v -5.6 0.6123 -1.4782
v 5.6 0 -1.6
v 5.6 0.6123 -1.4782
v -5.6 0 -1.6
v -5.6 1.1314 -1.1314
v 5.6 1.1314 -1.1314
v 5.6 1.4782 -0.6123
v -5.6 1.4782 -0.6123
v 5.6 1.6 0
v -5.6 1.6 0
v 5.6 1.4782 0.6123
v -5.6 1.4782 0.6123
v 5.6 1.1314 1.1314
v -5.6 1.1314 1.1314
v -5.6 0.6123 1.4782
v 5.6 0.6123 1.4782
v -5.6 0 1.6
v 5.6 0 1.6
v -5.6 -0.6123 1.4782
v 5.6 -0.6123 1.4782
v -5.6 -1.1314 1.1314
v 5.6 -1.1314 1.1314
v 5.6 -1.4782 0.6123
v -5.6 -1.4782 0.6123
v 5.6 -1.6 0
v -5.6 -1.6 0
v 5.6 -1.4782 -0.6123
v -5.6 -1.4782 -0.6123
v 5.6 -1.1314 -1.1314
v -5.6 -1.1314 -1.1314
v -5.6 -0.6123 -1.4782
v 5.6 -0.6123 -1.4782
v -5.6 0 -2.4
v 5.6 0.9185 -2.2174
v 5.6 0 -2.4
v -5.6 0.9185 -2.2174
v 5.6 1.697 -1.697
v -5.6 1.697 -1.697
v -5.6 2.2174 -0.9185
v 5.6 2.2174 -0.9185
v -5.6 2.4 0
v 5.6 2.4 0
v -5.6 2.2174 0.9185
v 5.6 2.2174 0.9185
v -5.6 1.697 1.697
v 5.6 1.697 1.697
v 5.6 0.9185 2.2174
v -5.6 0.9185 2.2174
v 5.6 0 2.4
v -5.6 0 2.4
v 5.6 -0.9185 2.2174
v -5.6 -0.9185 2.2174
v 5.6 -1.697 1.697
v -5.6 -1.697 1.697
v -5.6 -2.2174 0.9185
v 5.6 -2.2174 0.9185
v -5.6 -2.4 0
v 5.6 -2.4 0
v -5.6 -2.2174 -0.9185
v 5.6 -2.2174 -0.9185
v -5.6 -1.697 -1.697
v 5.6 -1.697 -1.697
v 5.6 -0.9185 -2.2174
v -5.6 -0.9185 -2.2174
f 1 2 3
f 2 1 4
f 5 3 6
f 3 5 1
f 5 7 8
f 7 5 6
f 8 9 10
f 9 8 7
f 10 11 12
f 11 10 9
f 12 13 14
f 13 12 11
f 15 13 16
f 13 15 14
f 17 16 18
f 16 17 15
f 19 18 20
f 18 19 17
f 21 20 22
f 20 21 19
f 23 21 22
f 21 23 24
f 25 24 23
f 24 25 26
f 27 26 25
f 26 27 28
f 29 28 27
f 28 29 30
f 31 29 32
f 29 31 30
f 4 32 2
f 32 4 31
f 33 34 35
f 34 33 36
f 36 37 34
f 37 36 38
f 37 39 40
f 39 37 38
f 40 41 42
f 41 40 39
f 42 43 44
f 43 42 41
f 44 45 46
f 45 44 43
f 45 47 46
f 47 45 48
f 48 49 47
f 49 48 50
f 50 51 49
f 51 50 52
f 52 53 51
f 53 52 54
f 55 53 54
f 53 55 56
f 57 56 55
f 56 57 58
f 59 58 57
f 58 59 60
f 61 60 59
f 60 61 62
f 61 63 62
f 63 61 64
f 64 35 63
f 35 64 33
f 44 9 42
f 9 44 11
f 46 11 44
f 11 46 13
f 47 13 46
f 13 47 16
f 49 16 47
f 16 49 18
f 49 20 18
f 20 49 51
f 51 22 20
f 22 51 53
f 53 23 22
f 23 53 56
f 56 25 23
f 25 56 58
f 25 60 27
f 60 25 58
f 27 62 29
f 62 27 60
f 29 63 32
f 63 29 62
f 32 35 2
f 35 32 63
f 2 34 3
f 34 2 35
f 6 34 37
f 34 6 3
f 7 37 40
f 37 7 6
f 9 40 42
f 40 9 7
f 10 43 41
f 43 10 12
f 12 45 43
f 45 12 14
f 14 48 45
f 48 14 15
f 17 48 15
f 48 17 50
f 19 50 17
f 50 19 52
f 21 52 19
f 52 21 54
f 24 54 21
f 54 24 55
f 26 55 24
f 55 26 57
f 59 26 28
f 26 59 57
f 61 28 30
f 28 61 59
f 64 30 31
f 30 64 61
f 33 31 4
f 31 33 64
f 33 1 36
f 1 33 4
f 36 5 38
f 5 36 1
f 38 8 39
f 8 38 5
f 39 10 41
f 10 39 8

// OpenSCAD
// file: ../p/4-4ring2.scad
use <../lib.scad>
function ldraw_lib__4_4ring2() = [
// 0 Ring  2 x 1.0
// 0 Name: 4-4ring2.dat
// 0 Author: James Jessiman
// 0 !LDRAW_ORG Primitive UPDATE 2009-01
// 0 !LICENSE Licensed under CC BY 2.0 and CC BY 4.0 : see CAreadme.txt
// 
// 0 BFC CERTIFY CCW
  [0,"BFC","CERTIFY"],
  [0,"BFC","CCW"],
// 
// 0 !HISTORY 1998-12-15 [PTadmin] Official Update 1998-10
// 0 !HISTORY 2002-04-05 [hafhead] Added BFC statement
// 0 !HISTORY 2002-04-25 [PTadmin] Official Update 2002-02
// 0 !HISTORY 2007-06-24 [PTadmin] Header formatted for Contributor Agreement
// 0 !HISTORY 2008-07-01 [PTadmin] Official Update 2008-01
// 0 !HISTORY 2008-08-26 [cwdee] Switch polygon winding and rename
// 0 !HISTORY 2009-05-02 [PTadmin] Official Update 2009-01
// 
// 
// 4 16 -1.1481 0 2.7717 -0.7654 0 1.8478 0 0 2 0 0 3
  [4,16,-1.1481,0,2.7717,-0.7654,0,1.8478,0,0,2,0,0,3],
// 4 16 -2.1213 0 2.1213 -1.4142 0 1.4142 -0.7654 0 1.8478 -1.1481 0 2.7717
  [4,16,-2.1213,0,2.1213,-1.4142,0,1.4142,-0.7654,0,1.8478,-1.1481,0,2.7717],
// 4 16 -2.7717 0 1.1481 -1.8478 0 0.7654 -1.4142 0 1.4142 -2.1213 0 2.1213
  [4,16,-2.7717,0,1.1481,-1.8478,0,0.7654,-1.4142,0,1.4142,-2.1213,0,2.1213],
// 4 16 -3 0 0 -2 0 0 -1.8478 0 0.7654 -2.7717 0 1.1481
  [4,16,-3,0,0,-2,0,0,-1.8478,0,0.7654,-2.7717,0,1.1481],
// 4 16 -2.7717 0 -1.1481 -1.8478 0 -0.7654 -2 0 0 -3 0 0
  [4,16,-2.7717,0,-1.1481,-1.8478,0,-0.7654,-2,0,0,-3,0,0],
// 4 16 -2.1213 0 -2.1213 -1.4142 0 -1.4142 -1.8478 0 -0.7654 -2.7717 0 -1.1481
  [4,16,-2.1213,0,-2.1213,-1.4142,0,-1.4142,-1.8478,0,-0.7654,-2.7717,0,-1.1481],
// 4 16 -1.1481 0 -2.7717 -0.7654 0 -1.8478 -1.4142 0 -1.4142 -2.1213 0 -2.1213
  [4,16,-1.1481,0,-2.7717,-0.7654,0,-1.8478,-1.4142,0,-1.4142,-2.1213,0,-2.1213],
// 4 16 0 0 -3 0 0 -2 -0.7654 0 -1.8478 -1.1481 0 -2.7717
  [4,16,0,0,-3,0,0,-2,-0.7654,0,-1.8478,-1.1481,0,-2.7717],
// 4 16 1.1481 0 -2.7717 0.7654 0 -1.8478 0 0 -2 0 0 -3
  [4,16,1.1481,0,-2.7717,0.7654,0,-1.8478,0,0,-2,0,0,-3],
// 4 16 2.1213 0 -2.1213 1.4142 0 -1.4142 0.7654 0 -1.8478 1.1481 0 -2.7717
  [4,16,2.1213,0,-2.1213,1.4142,0,-1.4142,0.7654,0,-1.8478,1.1481,0,-2.7717],
// 4 16 2.7717 0 -1.1481 1.8478 0 -0.7654 1.4142 0 -1.4142 2.1213 0 -2.1213
  [4,16,2.7717,0,-1.1481,1.8478,0,-0.7654,1.4142,0,-1.4142,2.1213,0,-2.1213],
// 4 16 3 0 0 2 0 0 1.8478 0 -0.7654 2.7717 0 -1.1481
  [4,16,3,0,0,2,0,0,1.8478,0,-0.7654,2.7717,0,-1.1481],
// 4 16 2.7717 0 1.1481 1.8478 0 0.7654 2 0 0 3 0 0
  [4,16,2.7717,0,1.1481,1.8478,0,0.7654,2,0,0,3,0,0],
// 4 16 2.1213 0 2.1213 1.4142 0 1.4142 1.8478 0 0.7654 2.7717 0 1.1481
  [4,16,2.1213,0,2.1213,1.4142,0,1.4142,1.8478,0,0.7654,2.7717,0,1.1481],
// 4 16 1.1481 0 2.7717 0.7654 0 1.8478 1.4142 0 1.4142 2.1213 0 2.1213
  [4,16,1.1481,0,2.7717,0.7654,0,1.8478,1.4142,0,1.4142,2.1213,0,2.1213],
// 4 16 0 0 3 0 0 2 0.7654 0 1.8478 1.1481 0 2.7717
  [4,16,0,0,3,0,0,2,0.7654,0,1.8478,1.1481,0,2.7717],
// 0
];
module ldraw_lib__4_4ring2(step=0, col=false, unit=2/5, alt=false, line=0.2, solid=!$preview)
    makepoly(ldraw_lib__4_4ring2(), step=step, col=col, unit=unit, alt=alt, line=line, solid=solid);
ldraw_lib__4_4ring2(line=0.2);
// file: ../p/4-4edge.scad
use <../lib.scad>
function ldraw_lib__4_4edge() = [
// 0 Circle 1.0
// 0 Name: 4-4edge.dat
// 0 Author: James Jessiman
// 0 !LDRAW_ORG Primitive UPDATE 2017-01
// 0 !LICENSE Licensed under CC BY 4.0 : see CAreadme.txt
// 
// 0 BFC CERTIFY CCW
  [0,"BFC","CERTIFY"],
  [0,"BFC","CCW"],
// 
// 0 !HISTORY 1998-12-15 [PTadmin] Official Update 1998-10
// 0 !HISTORY 2005-12-28 [PTadmin] Official Update 2005-01
// 0 !HISTORY 2007-06-24 [PTadmin] Header formatted for Contributor Agreement
// 0 !HISTORY 2008-07-01 [PTadmin] Official Update 2008-01
// 0 !HISTORY 2017-01-15 [Steffen] BFCed
// 0 !HISTORY 2017-12-30 [PTadmin] Official Update 2017-01
// 
// 
// 2 24 1 0 0 0.9239 0 0.3827
  [2,24,1,0,0,0.9239,0,0.3827],
// 2 24 0.9239 0 0.3827 0.7071 0 0.7071
  [2,24,0.9239,0,0.3827,0.7071,0,0.7071],
// 2 24 0.7071 0 0.7071 0.3827 0 0.9239
  [2,24,0.7071,0,0.7071,0.3827,0,0.9239],
// 2 24 0.3827 0 0.9239 0 0 1
  [2,24,0.3827,0,0.9239,0,0,1],
// 2 24 0 0 1 -0.3827 0 0.9239
  [2,24,0,0,1,-0.3827,0,0.9239],
// 2 24 -0.3827 0 0.9239 -0.7071 0 0.7071
  [2,24,-0.3827,0,0.9239,-0.7071,0,0.7071],
// 2 24 -0.7071 0 0.7071 -0.9239 0 0.3827
  [2,24,-0.7071,0,0.7071,-0.9239,0,0.3827],
// 2 24 -0.9239 0 0.3827 -1 0 -0
  [2,24,-0.9239,0,0.3827,-1,0,-0],
// 2 24 -1 0 -0 -0.9239 0 -0.3827
  [2,24,-1,0,-0,-0.9239,0,-0.3827],
// 2 24 -0.9239 0 -0.3827 -0.7071 0 -0.7071
  [2,24,-0.9239,0,-0.3827,-0.7071,0,-0.7071],
// 2 24 -0.7071 0 -0.7071 -0.3827 0 -0.9239
  [2,24,-0.7071,0,-0.7071,-0.3827,0,-0.9239],
// 2 24 -0.3827 0 -0.9239 0 0 -1
  [2,24,-0.3827,0,-0.9239,0,0,-1],
// 2 24 0 0 -1 0.3827 0 -0.9239
  [2,24,0,0,-1,0.3827,0,-0.9239],
// 2 24 0.3827 0 -0.9239 0.7071 0 -0.7071
  [2,24,0.3827,0,-0.9239,0.7071,0,-0.7071],
// 2 24 0.7071 0 -0.7071 0.9239 0 -0.3827
  [2,24,0.7071,0,-0.7071,0.9239,0,-0.3827],
// 2 24 0.9239 0 -0.3827 1 0 0
  [2,24,0.9239,0,-0.3827,1,0,0],
];
module ldraw_lib__4_4edge(step=0, col=false, unit=2/5, alt=false, line=0.2, solid=!$preview)
    makepoly(ldraw_lib__4_4edge(), step=step, col=col, unit=unit, alt=alt, line=line, solid=solid);
ldraw_lib__4_4edge(line=0.2);
// file: ../p/4-4cyli.scad
use <../lib.scad>
function ldraw_lib__4_4cyli() = [
// 0 Cylinder 1.0
// 0 Name: 4-4cyli.dat
// 0 Author: James Jessiman
// 0 !LDRAW_ORG Primitive UPDATE 2005-01
// 0 !LICENSE Licensed under CC BY 2.0 and CC BY 4.0 : see CAreadme.txt
// 
// 0 BFC CERTIFY CCW
  [0,"BFC","CERTIFY"],
  [0,"BFC","CCW"],
// 
// 0 !HISTORY 1998-12-15 [PTadmin] Official Update 1998-10
// 0 !HISTORY 2002-03-23 [sbliss] Added BFC statement; merged headers from files in distributions LDraw 0.27 and Complete.
// 0 !HISTORY 2002-04-25 [PTadmin] Official Update 2002-02
// 0 !HISTORY 2004-12-14 [guyvivan] BFC CCW
// 0 !HISTORY 2005-12-28 [PTadmin] Official Update 2005-01
// 0 !HISTORY 2007-06-24 [PTadmin] Header formatted for Contributor Agreement
// 0 !HISTORY 2008-07-01 [PTadmin] Official Update 2008-01
// 
// 
// 4 16 1 1 0 0.9239 1 0.3827 0.9239 0 0.3827 1 0 0
  [4,16,1,1,0,0.9239,1,0.3827,0.9239,0,0.3827,1,0,0],
// 5 24 1 0 0 1 1 0 0.9239 0 0.3827 0.9239 0 -0.3827
  [5,24,1,0,0,1,1,0,0.9239,0,0.3827,0.9239,0,-0.3827],
// 4 16 0.9239 1 0.3827 0.7071 1 0.7071 0.7071 0 0.7071 0.9239 0 0.3827
  [4,16,0.9239,1,0.3827,0.7071,1,0.7071,0.7071,0,0.7071,0.9239,0,0.3827],
// 5 24 0.9239 0 0.3827 0.9239 1 0.3827 0.7071 0 0.7071 1 0 0
  [5,24,0.9239,0,0.3827,0.9239,1,0.3827,0.7071,0,0.7071,1,0,0],
// 4 16 0.7071 1 0.7071 0.3827 1 0.9239 0.3827 0 0.9239 0.7071 0 0.7071
  [4,16,0.7071,1,0.7071,0.3827,1,0.9239,0.3827,0,0.9239,0.7071,0,0.7071],
// 5 24 0.7071 0 0.7071 0.7071 1 0.7071 0.3827 0 0.9239 0.9239 0 0.3827
  [5,24,0.7071,0,0.7071,0.7071,1,0.7071,0.3827,0,0.9239,0.9239,0,0.3827],
// 4 16 0.3827 1 0.9239 0 1 1 0 0 1 0.3827 0 0.9239
  [4,16,0.3827,1,0.9239,0,1,1,0,0,1,0.3827,0,0.9239],
// 5 24 0.3827 0 0.9239 0.3827 1 0.9239 0 0 1 0.7071 0 0.7071
  [5,24,0.3827,0,0.9239,0.3827,1,0.9239,0,0,1,0.7071,0,0.7071],
// 4 16 0 1 1 -0.3827 1 0.9239 -0.3827 0 0.9239 0 0 1
  [4,16,0,1,1,-0.3827,1,0.9239,-0.3827,0,0.9239,0,0,1],
// 5 24 0 0 1 0 1 1 -0.3827 0 0.9239 0.3827 0 0.9239
  [5,24,0,0,1,0,1,1,-0.3827,0,0.9239,0.3827,0,0.9239],
// 4 16 -0.3827 1 0.9239 -0.7071 1 0.7071 -0.7071 0 0.7071 -0.3827 0 0.9239
  [4,16,-0.3827,1,0.9239,-0.7071,1,0.7071,-0.7071,0,0.7071,-0.3827,0,0.9239],
// 5 24 -0.3827 0 0.9239 -0.3827 1 0.9239 -0.7071 0 0.7071 0 0 1
  [5,24,-0.3827,0,0.9239,-0.3827,1,0.9239,-0.7071,0,0.7071,0,0,1],
// 4 16 -0.7071 1 0.7071 -0.9239 1 0.3827 -0.9239 0 0.3827 -0.7071 0 0.7071
  [4,16,-0.7071,1,0.7071,-0.9239,1,0.3827,-0.9239,0,0.3827,-0.7071,0,0.7071],
// 5 24 -0.7071 0 0.7071 -0.7071 1 0.7071 -0.9239 0 0.3827 -0.3827 0 0.9239
  [5,24,-0.7071,0,0.7071,-0.7071,1,0.7071,-0.9239,0,0.3827,-0.3827,0,0.9239],
// 4 16 -0.9239 1 0.3827 -1 1 0 -1 0 0 -0.9239 0 0.3827
  [4,16,-0.9239,1,0.3827,-1,1,0,-1,0,0,-0.9239,0,0.3827],
// 5 24 -0.9239 0 0.3827 -0.9239 1 0.3827 -1 0 0 -0.7071 0 0.7071
  [5,24,-0.9239,0,0.3827,-0.9239,1,0.3827,-1,0,0,-0.7071,0,0.7071],
// 4 16 -1 1 0 -0.9239 1 -0.3827 -0.9239 0 -0.3827 -1 0 0
  [4,16,-1,1,0,-0.9239,1,-0.3827,-0.9239,0,-0.3827,-1,0,0],
// 5 24 -1 0 0 -1 1 0 -0.9239 0 -0.3827 -0.9239 0 0.3827
  [5,24,-1,0,0,-1,1,0,-0.9239,0,-0.3827,-0.9239,0,0.3827],
// 4 16 -0.9239 1 -0.3827 -0.7071 1 -0.7071 -0.7071 0 -0.7071 -0.9239 0 -0.3827
  [4,16,-0.9239,1,-0.3827,-0.7071,1,-0.7071,-0.7071,0,-0.7071,-0.9239,0,-0.3827],
// 5 24 -0.9239 0 -0.3827 -0.9239 1 -0.3827 -0.7071 0 -0.7071 -1 0 0
  [5,24,-0.9239,0,-0.3827,-0.9239,1,-0.3827,-0.7071,0,-0.7071,-1,0,0],
// 4 16 -0.7071 1 -0.7071 -0.3827 1 -0.9239 -0.3827 0 -0.9239 -0.7071 0 -0.7071
  [4,16,-0.7071,1,-0.7071,-0.3827,1,-0.9239,-0.3827,0,-0.9239,-0.7071,0,-0.7071],
// 5 24 -0.7071 0 -0.7071 -0.7071 1 -0.7071 -0.3827 0 -0.9239 -0.9239 0 -0.3827
  [5,24,-0.7071,0,-0.7071,-0.7071,1,-0.7071,-0.3827,0,-0.9239,-0.9239,0,-0.3827],
// 4 16 -0.3827 1 -0.9239 0 1 -1 0 0 -1 -0.3827 0 -0.9239
  [4,16,-0.3827,1,-0.9239,0,1,-1,0,0,-1,-0.3827,0,-0.9239],
// 5 24 -0.3827 0 -0.9239 -0.3827 1 -0.9239 0 0 -1 -0.7071 0 -0.7071
  [5,24,-0.3827,0,-0.9239,-0.3827,1,-0.9239,0,0,-1,-0.7071,0,-0.7071],
// 4 16 0 1 -1 0.3827 1 -0.9239 0.3827 0 -0.9239 0 0 -1
  [4,16,0,1,-1,0.3827,1,-0.9239,0.3827,0,-0.9239,0,0,-1],
// 5 24 0 0 -1 0 1 -1 0.3827 0 -0.9239 -0.3827 0 -0.9239
  [5,24,0,0,-1,0,1,-1,0.3827,0,-0.9239,-0.3827,0,-0.9239],
// 4 16 0.3827 1 -0.9239 0.7071 1 -0.7071 0.7071 0 -0.7071 0.3827 0 -0.9239
  [4,16,0.3827,1,-0.9239,0.7071,1,-0.7071,0.7071,0,-0.7071,0.3827,0,-0.9239],
// 5 24 0.3827 0 -0.9239 0.3827 1 -0.9239 0.7071 0 -0.7071 0 0 -1
  [5,24,0.3827,0,-0.9239,0.3827,1,-0.9239,0.7071,0,-0.7071,0,0,-1],
// 4 16 0.7071 1 -0.7071 0.9239 1 -0.3827 0.9239 0 -0.3827 0.7071 0 -0.7071
  [4,16,0.7071,1,-0.7071,0.9239,1,-0.3827,0.9239,0,-0.3827,0.7071,0,-0.7071],
// 5 24 0.7071 0 -0.7071 0.7071 1 -0.7071 0.9239 0 -0.3827 0.3827 0 -0.9239
  [5,24,0.7071,0,-0.7071,0.7071,1,-0.7071,0.9239,0,-0.3827,0.3827,0,-0.9239],
// 4 16 0.9239 1 -0.3827 1 1 0 1 0 0 0.9239 0 -0.3827
  [4,16,0.9239,1,-0.3827,1,1,0,1,0,0,0.9239,0,-0.3827],
// 5 24 0.9239 0 -0.3827 0.9239 1 -0.3827 1 0 0 0.7071 0 -0.7071
  [5,24,0.9239,0,-0.3827,0.9239,1,-0.3827,1,0,0,0.7071,0,-0.7071],
// 0
];
module ldraw_lib__4_4cyli(step=0, col=false, unit=2/5, alt=false, line=0.2, solid=!$preview)
    makepoly(ldraw_lib__4_4cyli(), step=step, col=col, unit=unit, alt=alt, line=line, solid=solid);
ldraw_lib__4_4cyli(line=0.2);
// main file
use <../lib.scad>
use <../p/4-4cyli.scad>
use <../p/4-4edge.scad>
use <../p/4-4ring2.scad>
function ldraw_lib__3111() = [
// 0 ~Axle Bush 1.4L
// 0 Name: 3111.dat
// 0 Author: James Jessiman
// 0 !LDRAW_ORG Part UPDATE 2018-02
// 0 !LICENSE Licensed under CC BY 4.0 : see CAreadme.txt
// 
// 0 BFC CERTIFY CW
  [0,"BFC","CERTIFY"],
  [0,"BFC","CW"],
// 
// 0 !CATEGORY Wheel
// 
// 0 !HISTORY 2007-06-25 [PTadmin] Header formatted for Contributor Agreement
// 0 !HISTORY 2008-07-01 [PTadmin] Official Update 2008-01
// 0 !HISTORY 2008-07-07 [mkennedy] Completed header, BFC'ed, Optimized
// 0 !HISTORY 2008-08-23 [PTadmin] Renamed from 34d
// 0 !HISTORY 2009-05-02 [PTadmin] Official Update 2009-01
// 0 !HISTORY 2018-11-24 [cwdee] Update description
// 0 !HISTORY 2018-12-08 [PTadmin] Official Update 2018-02
// 
// 
// 0 BFC INVERTNEXT
  [0,"BFC","INVERTNEXT"],
// 1 16 14 0 0 0 -28 0 4 0 0 0 0 4 4-4cyli.dat
  [1,16,14,0,0,0,-28,0,4,0,0,0,0,4, ldraw_lib__4_4cyli()],
// 1 16 14 0 0 0 -28 0 6 0 0 0 0 6 4-4cyli.dat
  [1,16,14,0,0,0,-28,0,6,0,0,0,0,6, ldraw_lib__4_4cyli()],
// 1 16 14 0 0 0 1 0 4 0 0 0 0 4 4-4edge.dat
  [1,16,14,0,0,0,1,0,4,0,0,0,0,4, ldraw_lib__4_4edge()],
// 1 16 -14 0 0 0 1 0 4 0 0 0 0 4 4-4edge.dat
  [1,16,-14,0,0,0,1,0,4,0,0,0,0,4, ldraw_lib__4_4edge()],
// 1 16 14 0 0 0 1 0 6 0 0 0 0 6 4-4edge.dat
  [1,16,14,0,0,0,1,0,6,0,0,0,0,6, ldraw_lib__4_4edge()],
// 1 16 -14 0 0 0 1 0 6 0 0 0 0 6 4-4edge.dat
  [1,16,-14,0,0,0,1,0,6,0,0,0,0,6, ldraw_lib__4_4edge()],
// 1 16 14 0 0 0 -1 0 2 0 0 0 0 2 4-4ring2.dat
  [1,16,14,0,0,0,-1,0,2,0,0,0,0,2, ldraw_lib__4_4ring2()],
// 1 16 -14 0 0 0 1 0 2 0 0 0 0 2 4-4ring2.dat
  [1,16,-14,0,0,0,1,0,2,0,0,0,0,2, ldraw_lib__4_4ring2()],
// 0
// 
];
module ldraw_lib__3111(step=0, col=false, unit=2/5, alt=false, line=0.2, solid=!$preview)
    makepoly(ldraw_lib__3111(), step=step, col=col, unit=unit, alt=alt, line=line, solid=solid);
ldraw_lib__3111(line=0.2);
